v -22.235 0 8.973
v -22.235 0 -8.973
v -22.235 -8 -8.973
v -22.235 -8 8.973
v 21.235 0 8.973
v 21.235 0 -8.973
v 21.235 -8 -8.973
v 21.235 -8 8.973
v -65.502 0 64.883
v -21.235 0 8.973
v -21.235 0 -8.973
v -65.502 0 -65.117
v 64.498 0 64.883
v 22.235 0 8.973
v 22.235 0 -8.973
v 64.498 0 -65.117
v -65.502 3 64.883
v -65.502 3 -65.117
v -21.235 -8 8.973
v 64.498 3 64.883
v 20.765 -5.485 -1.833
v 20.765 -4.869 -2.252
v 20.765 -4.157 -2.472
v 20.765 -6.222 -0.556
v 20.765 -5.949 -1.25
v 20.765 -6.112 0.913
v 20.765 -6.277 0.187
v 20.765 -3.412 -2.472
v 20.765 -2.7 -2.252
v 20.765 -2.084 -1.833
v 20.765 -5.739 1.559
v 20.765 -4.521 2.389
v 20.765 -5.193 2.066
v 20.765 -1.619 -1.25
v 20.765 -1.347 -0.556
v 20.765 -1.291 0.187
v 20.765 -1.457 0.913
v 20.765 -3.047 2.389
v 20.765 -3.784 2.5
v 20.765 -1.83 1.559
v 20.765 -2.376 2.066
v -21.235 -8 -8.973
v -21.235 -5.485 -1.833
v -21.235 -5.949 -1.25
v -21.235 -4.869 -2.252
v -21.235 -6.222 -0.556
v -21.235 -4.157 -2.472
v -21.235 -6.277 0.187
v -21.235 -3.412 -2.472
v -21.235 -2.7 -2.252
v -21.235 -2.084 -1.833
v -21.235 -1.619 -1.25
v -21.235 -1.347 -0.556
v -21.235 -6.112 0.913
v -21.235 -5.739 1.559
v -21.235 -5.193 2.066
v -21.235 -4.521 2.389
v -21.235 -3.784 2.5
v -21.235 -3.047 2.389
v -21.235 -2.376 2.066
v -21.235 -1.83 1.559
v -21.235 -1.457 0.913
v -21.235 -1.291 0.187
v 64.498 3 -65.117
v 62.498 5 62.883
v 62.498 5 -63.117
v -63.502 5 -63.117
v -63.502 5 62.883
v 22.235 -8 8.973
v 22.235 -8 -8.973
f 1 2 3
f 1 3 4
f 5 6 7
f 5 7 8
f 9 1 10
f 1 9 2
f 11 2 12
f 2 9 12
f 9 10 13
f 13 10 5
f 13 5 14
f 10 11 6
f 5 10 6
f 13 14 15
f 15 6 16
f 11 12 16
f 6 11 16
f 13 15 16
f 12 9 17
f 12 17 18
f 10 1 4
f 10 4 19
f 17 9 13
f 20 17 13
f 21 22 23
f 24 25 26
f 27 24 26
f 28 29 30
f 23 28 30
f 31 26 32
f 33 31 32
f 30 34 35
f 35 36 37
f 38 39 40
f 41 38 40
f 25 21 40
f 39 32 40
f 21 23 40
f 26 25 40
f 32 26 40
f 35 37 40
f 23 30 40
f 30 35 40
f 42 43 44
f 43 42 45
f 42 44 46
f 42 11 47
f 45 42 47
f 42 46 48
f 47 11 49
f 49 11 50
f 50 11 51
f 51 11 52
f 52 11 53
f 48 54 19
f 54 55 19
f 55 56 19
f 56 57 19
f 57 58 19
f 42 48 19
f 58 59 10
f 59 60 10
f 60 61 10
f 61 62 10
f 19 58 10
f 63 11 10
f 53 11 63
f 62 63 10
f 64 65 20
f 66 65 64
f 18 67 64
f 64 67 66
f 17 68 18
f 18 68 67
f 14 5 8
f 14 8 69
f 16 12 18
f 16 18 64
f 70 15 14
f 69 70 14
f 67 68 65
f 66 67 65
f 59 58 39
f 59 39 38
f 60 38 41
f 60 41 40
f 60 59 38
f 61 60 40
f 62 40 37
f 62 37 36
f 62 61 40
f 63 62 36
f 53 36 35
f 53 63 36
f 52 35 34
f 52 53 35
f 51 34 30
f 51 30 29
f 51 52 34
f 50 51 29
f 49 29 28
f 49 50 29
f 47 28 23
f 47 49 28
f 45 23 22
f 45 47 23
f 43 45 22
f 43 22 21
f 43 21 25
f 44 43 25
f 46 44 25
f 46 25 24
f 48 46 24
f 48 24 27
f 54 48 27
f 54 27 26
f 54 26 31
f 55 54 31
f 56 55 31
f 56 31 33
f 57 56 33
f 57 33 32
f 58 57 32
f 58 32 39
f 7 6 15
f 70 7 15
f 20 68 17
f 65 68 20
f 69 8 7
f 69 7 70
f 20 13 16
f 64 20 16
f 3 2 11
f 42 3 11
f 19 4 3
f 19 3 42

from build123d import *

# Parameters (mm, degrees)
SKETCH_1_W      = 130
SKETCH_1_H      = 130
EXTRUDE_1_DEPTH = 5
SKETCH_2_W      = 1
SKETCH_2_H      = 17.945111322
EXTRUDE_2_DEPTH = 8
SKETCH_3_R      = 2.5
EXTRUDE_3_DEPTH = 43
CHAMFER_1_SIZE  = 2


with BuildPart() as part:
    # 草图1 → 凸台-拉伸1 (new body)
    with BuildSketch(Plane(origin=(0, 0, 0), x_dir=(1, 0, 0), z_dir=(0, 1, 0))):
        with Locations((-0.501834335, 0.116589736)):
            Rectangle(SKETCH_1_W, SKETCH_1_H)
    extrude(amount=EXTRUDE_1_DEPTH)

    # 草图2 → 凸台-拉伸2 (add)
    with BuildSketch(Plane.XZ):
        with Locations((21.735, 0)):
            Rectangle(SKETCH_2_W, SKETCH_2_H)
        with Locations((-21.735, 0)):
            Rectangle(SKETCH_2_W, SKETCH_2_H)
    extrude(amount=EXTRUDE_2_DEPTH)

    # 草图3 → 凸台-拉伸3 (add)
    with BuildSketch(Plane.ZY.offset(22.235)):
        with Locations((0, -3.784370538)):
            Circle(SKETCH_3_R)
    extrude(amount=-EXTRUDE_3_DEPTH)

    # 倒角1
    chamfer_1_edges = [part.edges().sort_by_distance(p)[0] for p in [
        (64.498165665, 5, -0.116589736),
        (-0.501834335, 5, -65.116589736),
        (-65.501834335, 5, -0.116589736),
        (-0.501834335, 5, 64.883410264),
    ]]
    chamfer(chamfer_1_edges, length=CHAMFER_1_SIZE)


solid = part.part
